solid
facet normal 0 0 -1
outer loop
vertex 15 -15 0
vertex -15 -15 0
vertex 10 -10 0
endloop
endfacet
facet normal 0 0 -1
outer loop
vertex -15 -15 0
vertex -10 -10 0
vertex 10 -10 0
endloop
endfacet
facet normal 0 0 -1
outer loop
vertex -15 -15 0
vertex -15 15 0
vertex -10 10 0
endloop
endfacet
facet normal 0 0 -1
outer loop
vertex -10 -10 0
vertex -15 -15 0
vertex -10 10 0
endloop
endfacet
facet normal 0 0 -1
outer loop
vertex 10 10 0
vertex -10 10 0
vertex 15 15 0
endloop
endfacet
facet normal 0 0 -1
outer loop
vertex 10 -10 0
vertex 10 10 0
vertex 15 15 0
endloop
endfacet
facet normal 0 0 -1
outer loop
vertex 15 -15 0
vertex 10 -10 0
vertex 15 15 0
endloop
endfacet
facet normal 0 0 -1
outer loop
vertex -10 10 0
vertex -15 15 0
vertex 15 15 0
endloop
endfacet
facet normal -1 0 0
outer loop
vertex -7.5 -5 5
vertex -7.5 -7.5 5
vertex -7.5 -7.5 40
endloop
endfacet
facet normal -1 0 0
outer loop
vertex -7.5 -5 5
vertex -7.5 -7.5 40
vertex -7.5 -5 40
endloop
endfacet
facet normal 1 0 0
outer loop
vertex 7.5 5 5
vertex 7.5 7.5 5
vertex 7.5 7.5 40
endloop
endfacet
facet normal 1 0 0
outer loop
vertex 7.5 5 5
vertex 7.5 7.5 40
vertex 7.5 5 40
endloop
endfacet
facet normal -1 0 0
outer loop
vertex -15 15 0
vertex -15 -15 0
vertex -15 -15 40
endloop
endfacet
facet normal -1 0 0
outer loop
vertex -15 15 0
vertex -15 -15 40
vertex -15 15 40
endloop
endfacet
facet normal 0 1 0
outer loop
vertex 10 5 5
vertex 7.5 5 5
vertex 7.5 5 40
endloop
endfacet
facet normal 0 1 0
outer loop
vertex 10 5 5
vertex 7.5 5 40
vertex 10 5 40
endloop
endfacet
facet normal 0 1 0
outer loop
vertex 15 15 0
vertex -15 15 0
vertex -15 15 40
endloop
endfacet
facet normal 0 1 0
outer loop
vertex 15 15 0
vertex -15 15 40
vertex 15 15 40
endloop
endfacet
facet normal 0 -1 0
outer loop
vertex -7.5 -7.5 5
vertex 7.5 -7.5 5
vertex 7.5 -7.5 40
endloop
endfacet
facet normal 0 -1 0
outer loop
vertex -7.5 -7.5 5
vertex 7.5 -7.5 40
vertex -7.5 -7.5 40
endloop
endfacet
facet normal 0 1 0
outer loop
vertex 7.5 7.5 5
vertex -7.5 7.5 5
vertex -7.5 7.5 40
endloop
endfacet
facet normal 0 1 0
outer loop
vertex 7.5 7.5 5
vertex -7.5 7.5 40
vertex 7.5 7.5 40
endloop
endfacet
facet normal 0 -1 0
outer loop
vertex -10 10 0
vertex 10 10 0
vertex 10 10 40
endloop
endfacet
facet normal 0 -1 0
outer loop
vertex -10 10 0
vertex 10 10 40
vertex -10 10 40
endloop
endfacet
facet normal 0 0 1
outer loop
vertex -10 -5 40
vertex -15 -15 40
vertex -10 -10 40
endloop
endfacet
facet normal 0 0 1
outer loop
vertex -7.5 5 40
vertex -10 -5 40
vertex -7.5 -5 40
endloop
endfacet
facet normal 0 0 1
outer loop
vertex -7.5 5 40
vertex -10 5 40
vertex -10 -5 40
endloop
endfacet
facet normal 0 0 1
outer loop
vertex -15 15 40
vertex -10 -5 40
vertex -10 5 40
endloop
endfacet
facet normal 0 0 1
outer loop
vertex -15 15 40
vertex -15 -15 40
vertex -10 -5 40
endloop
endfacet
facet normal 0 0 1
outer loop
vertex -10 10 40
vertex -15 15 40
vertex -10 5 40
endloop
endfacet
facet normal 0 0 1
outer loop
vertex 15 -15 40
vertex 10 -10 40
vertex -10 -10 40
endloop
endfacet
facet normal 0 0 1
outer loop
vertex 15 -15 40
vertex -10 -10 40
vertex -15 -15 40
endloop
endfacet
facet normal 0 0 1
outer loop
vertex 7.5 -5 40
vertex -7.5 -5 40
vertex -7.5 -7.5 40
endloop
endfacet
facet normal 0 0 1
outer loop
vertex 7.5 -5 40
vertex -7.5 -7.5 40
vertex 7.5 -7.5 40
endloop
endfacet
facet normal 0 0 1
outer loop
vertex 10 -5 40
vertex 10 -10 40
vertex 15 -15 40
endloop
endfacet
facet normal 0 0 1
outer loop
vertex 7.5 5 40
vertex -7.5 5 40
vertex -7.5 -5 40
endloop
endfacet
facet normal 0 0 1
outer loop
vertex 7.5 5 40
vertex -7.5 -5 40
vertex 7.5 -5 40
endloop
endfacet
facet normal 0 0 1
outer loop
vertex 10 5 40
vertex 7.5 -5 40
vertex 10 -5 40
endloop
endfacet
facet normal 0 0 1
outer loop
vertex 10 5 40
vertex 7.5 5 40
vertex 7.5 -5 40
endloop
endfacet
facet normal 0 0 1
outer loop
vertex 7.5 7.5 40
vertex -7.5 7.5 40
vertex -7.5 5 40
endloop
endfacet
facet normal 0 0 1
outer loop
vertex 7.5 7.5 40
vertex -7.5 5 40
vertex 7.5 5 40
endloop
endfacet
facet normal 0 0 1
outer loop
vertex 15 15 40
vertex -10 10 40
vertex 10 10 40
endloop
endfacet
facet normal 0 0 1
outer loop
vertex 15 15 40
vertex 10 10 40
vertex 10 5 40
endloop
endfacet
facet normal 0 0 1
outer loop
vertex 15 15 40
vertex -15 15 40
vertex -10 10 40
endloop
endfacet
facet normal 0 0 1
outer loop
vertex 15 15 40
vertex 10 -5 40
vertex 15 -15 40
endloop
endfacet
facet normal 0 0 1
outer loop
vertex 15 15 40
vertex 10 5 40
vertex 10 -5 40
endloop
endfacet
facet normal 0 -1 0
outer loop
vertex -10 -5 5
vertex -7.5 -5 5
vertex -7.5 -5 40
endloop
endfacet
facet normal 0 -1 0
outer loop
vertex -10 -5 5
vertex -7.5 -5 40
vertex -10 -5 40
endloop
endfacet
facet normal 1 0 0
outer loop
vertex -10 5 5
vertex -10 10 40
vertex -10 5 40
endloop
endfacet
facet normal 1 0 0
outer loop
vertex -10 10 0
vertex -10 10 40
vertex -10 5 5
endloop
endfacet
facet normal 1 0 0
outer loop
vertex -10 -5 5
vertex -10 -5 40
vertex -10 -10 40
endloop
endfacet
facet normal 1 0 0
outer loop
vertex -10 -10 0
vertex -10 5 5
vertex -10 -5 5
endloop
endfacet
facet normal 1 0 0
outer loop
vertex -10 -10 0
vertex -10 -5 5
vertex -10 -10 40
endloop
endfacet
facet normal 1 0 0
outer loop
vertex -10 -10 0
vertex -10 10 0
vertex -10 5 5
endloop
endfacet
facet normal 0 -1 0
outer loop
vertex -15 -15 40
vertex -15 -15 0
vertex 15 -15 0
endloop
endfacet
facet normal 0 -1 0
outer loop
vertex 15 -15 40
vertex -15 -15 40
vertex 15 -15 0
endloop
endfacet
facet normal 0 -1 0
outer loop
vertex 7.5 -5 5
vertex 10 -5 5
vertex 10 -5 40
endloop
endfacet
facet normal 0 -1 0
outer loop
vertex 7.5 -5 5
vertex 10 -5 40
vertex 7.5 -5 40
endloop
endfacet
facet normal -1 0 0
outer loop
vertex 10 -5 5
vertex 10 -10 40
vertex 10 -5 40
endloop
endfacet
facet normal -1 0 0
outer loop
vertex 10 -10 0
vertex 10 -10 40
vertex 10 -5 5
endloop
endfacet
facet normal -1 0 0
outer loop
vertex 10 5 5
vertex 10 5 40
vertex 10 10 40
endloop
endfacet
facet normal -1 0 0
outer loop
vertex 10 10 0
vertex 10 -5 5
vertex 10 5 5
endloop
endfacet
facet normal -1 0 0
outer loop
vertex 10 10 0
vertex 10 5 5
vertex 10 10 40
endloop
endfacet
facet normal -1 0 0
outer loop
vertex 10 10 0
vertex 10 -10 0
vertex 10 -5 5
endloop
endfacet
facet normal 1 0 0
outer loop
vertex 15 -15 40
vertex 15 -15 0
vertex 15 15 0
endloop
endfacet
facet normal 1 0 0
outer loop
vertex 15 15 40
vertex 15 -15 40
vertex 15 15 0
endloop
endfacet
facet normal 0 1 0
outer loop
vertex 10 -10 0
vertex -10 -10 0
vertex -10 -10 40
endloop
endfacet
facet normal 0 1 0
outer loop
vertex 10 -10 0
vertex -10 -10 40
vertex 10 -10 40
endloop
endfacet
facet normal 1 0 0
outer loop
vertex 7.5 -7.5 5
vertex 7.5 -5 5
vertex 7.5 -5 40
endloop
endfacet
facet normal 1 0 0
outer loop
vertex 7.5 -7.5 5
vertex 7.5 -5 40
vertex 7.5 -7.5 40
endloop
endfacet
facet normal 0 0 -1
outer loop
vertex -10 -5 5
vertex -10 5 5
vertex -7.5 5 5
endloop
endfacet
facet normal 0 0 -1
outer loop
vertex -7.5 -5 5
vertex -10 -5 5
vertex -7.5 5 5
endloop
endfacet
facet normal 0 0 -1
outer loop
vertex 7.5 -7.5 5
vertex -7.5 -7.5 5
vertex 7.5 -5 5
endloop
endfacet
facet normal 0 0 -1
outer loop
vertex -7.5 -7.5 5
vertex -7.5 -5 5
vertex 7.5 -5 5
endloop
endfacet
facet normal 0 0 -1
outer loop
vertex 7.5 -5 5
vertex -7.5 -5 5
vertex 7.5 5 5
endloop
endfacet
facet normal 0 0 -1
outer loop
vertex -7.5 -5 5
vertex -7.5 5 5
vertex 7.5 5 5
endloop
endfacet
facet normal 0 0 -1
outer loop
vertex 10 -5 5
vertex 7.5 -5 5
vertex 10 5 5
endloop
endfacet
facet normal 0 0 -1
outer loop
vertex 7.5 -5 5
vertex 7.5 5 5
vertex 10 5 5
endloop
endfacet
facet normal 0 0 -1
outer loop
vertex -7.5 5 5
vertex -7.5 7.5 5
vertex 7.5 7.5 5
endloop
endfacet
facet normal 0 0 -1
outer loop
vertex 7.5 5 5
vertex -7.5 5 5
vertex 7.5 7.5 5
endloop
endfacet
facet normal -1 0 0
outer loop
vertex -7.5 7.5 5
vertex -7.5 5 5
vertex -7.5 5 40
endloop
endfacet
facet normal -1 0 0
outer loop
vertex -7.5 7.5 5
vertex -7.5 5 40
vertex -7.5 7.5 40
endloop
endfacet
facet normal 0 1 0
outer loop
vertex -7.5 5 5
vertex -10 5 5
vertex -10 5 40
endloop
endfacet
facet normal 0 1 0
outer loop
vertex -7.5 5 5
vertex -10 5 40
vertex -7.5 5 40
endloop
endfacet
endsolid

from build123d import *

# Parameters (mm, degrees)
F0_W     = 30
F0_H     = 30
F0_W_2   = 15
F0_H_2   = 10
F0_H_3   = 2.5
F0_W_3   = 2.5
F1_DEPTH = 40
F2_DEPTH = 5
F3_DEPTH = 40


with BuildPart() as f1:
    # F0 (on Top) → F1 (new body)
    with BuildSketch(Plane.XY):
        Rectangle(F0_W, F0_H)
        Polygon((10, 5), (10, -5), (10, -10), (-10, -10), (-10, -5), (-10, 5), (-10, 10), (10, 10), align=None, mode=Mode.SUBTRACT)
        Rectangle(F0_W_2, F0_H_2)
        Polygon((7.5, 7.5), (7.5, 5), (10, 5), (10, 10), (-10, 10), (-10, 5), (-7.5, 5), (-7.5, 7.5), align=None)
        Polygon((7.5, -5), (7.5, -7.5), (-7.5, -7.5), (-7.5, -5), (-10, -5), (-10, -10), (10, -10), (10, -5), align=None)
        with Locations((0, 6.25)):
            Rectangle(F0_W_2, F0_H_3)
        with Locations((0, -6.25)):
            Rectangle(F0_W_2, F0_H_3)
        with Locations((8.75, 0)):
            Rectangle(F0_W_3, F0_H_2)
        with Locations((-8.75, 0)):
            Rectangle(F0_W_3, F0_H_2)
    extrude(amount=F1_DEPTH)

    # F0 (on Top) → F2 (cut)
    with BuildSketch(Plane.XY):
        with Locations((0, -6.25)):
            Rectangle(F0_W_2, F0_H_3)
        Rectangle(F0_W_2, F0_H_2)
        with Locations((0, 6.25)):
            Rectangle(F0_W_2, F0_H_3)
        with Locations((8.75, 0)):
            Rectangle(F0_W_3, F0_H_2)
        with Locations((-8.75, 0)):
            Rectangle(F0_W_3, F0_H_2)
    extrude(amount=F2_DEPTH, mode=Mode.SUBTRACT)

    # F0 (on Top) → F3 (cut)
    with BuildSketch(Plane.XY):
        Polygon((7.5, -5), (7.5, -7.5), (-7.5, -7.5), (-7.5, -5), (-10, -5), (-10, -10), (10, -10), (10, -5), align=None)
        Polygon((7.5, 7.5), (7.5, 5), (10, 5), (10, 10), (-10, 10), (-10, 5), (-7.5, 5), (-7.5, 7.5), align=None)
    extrude(amount=F3_DEPTH, mode=Mode.SUBTRACT)


solid = f1.part
